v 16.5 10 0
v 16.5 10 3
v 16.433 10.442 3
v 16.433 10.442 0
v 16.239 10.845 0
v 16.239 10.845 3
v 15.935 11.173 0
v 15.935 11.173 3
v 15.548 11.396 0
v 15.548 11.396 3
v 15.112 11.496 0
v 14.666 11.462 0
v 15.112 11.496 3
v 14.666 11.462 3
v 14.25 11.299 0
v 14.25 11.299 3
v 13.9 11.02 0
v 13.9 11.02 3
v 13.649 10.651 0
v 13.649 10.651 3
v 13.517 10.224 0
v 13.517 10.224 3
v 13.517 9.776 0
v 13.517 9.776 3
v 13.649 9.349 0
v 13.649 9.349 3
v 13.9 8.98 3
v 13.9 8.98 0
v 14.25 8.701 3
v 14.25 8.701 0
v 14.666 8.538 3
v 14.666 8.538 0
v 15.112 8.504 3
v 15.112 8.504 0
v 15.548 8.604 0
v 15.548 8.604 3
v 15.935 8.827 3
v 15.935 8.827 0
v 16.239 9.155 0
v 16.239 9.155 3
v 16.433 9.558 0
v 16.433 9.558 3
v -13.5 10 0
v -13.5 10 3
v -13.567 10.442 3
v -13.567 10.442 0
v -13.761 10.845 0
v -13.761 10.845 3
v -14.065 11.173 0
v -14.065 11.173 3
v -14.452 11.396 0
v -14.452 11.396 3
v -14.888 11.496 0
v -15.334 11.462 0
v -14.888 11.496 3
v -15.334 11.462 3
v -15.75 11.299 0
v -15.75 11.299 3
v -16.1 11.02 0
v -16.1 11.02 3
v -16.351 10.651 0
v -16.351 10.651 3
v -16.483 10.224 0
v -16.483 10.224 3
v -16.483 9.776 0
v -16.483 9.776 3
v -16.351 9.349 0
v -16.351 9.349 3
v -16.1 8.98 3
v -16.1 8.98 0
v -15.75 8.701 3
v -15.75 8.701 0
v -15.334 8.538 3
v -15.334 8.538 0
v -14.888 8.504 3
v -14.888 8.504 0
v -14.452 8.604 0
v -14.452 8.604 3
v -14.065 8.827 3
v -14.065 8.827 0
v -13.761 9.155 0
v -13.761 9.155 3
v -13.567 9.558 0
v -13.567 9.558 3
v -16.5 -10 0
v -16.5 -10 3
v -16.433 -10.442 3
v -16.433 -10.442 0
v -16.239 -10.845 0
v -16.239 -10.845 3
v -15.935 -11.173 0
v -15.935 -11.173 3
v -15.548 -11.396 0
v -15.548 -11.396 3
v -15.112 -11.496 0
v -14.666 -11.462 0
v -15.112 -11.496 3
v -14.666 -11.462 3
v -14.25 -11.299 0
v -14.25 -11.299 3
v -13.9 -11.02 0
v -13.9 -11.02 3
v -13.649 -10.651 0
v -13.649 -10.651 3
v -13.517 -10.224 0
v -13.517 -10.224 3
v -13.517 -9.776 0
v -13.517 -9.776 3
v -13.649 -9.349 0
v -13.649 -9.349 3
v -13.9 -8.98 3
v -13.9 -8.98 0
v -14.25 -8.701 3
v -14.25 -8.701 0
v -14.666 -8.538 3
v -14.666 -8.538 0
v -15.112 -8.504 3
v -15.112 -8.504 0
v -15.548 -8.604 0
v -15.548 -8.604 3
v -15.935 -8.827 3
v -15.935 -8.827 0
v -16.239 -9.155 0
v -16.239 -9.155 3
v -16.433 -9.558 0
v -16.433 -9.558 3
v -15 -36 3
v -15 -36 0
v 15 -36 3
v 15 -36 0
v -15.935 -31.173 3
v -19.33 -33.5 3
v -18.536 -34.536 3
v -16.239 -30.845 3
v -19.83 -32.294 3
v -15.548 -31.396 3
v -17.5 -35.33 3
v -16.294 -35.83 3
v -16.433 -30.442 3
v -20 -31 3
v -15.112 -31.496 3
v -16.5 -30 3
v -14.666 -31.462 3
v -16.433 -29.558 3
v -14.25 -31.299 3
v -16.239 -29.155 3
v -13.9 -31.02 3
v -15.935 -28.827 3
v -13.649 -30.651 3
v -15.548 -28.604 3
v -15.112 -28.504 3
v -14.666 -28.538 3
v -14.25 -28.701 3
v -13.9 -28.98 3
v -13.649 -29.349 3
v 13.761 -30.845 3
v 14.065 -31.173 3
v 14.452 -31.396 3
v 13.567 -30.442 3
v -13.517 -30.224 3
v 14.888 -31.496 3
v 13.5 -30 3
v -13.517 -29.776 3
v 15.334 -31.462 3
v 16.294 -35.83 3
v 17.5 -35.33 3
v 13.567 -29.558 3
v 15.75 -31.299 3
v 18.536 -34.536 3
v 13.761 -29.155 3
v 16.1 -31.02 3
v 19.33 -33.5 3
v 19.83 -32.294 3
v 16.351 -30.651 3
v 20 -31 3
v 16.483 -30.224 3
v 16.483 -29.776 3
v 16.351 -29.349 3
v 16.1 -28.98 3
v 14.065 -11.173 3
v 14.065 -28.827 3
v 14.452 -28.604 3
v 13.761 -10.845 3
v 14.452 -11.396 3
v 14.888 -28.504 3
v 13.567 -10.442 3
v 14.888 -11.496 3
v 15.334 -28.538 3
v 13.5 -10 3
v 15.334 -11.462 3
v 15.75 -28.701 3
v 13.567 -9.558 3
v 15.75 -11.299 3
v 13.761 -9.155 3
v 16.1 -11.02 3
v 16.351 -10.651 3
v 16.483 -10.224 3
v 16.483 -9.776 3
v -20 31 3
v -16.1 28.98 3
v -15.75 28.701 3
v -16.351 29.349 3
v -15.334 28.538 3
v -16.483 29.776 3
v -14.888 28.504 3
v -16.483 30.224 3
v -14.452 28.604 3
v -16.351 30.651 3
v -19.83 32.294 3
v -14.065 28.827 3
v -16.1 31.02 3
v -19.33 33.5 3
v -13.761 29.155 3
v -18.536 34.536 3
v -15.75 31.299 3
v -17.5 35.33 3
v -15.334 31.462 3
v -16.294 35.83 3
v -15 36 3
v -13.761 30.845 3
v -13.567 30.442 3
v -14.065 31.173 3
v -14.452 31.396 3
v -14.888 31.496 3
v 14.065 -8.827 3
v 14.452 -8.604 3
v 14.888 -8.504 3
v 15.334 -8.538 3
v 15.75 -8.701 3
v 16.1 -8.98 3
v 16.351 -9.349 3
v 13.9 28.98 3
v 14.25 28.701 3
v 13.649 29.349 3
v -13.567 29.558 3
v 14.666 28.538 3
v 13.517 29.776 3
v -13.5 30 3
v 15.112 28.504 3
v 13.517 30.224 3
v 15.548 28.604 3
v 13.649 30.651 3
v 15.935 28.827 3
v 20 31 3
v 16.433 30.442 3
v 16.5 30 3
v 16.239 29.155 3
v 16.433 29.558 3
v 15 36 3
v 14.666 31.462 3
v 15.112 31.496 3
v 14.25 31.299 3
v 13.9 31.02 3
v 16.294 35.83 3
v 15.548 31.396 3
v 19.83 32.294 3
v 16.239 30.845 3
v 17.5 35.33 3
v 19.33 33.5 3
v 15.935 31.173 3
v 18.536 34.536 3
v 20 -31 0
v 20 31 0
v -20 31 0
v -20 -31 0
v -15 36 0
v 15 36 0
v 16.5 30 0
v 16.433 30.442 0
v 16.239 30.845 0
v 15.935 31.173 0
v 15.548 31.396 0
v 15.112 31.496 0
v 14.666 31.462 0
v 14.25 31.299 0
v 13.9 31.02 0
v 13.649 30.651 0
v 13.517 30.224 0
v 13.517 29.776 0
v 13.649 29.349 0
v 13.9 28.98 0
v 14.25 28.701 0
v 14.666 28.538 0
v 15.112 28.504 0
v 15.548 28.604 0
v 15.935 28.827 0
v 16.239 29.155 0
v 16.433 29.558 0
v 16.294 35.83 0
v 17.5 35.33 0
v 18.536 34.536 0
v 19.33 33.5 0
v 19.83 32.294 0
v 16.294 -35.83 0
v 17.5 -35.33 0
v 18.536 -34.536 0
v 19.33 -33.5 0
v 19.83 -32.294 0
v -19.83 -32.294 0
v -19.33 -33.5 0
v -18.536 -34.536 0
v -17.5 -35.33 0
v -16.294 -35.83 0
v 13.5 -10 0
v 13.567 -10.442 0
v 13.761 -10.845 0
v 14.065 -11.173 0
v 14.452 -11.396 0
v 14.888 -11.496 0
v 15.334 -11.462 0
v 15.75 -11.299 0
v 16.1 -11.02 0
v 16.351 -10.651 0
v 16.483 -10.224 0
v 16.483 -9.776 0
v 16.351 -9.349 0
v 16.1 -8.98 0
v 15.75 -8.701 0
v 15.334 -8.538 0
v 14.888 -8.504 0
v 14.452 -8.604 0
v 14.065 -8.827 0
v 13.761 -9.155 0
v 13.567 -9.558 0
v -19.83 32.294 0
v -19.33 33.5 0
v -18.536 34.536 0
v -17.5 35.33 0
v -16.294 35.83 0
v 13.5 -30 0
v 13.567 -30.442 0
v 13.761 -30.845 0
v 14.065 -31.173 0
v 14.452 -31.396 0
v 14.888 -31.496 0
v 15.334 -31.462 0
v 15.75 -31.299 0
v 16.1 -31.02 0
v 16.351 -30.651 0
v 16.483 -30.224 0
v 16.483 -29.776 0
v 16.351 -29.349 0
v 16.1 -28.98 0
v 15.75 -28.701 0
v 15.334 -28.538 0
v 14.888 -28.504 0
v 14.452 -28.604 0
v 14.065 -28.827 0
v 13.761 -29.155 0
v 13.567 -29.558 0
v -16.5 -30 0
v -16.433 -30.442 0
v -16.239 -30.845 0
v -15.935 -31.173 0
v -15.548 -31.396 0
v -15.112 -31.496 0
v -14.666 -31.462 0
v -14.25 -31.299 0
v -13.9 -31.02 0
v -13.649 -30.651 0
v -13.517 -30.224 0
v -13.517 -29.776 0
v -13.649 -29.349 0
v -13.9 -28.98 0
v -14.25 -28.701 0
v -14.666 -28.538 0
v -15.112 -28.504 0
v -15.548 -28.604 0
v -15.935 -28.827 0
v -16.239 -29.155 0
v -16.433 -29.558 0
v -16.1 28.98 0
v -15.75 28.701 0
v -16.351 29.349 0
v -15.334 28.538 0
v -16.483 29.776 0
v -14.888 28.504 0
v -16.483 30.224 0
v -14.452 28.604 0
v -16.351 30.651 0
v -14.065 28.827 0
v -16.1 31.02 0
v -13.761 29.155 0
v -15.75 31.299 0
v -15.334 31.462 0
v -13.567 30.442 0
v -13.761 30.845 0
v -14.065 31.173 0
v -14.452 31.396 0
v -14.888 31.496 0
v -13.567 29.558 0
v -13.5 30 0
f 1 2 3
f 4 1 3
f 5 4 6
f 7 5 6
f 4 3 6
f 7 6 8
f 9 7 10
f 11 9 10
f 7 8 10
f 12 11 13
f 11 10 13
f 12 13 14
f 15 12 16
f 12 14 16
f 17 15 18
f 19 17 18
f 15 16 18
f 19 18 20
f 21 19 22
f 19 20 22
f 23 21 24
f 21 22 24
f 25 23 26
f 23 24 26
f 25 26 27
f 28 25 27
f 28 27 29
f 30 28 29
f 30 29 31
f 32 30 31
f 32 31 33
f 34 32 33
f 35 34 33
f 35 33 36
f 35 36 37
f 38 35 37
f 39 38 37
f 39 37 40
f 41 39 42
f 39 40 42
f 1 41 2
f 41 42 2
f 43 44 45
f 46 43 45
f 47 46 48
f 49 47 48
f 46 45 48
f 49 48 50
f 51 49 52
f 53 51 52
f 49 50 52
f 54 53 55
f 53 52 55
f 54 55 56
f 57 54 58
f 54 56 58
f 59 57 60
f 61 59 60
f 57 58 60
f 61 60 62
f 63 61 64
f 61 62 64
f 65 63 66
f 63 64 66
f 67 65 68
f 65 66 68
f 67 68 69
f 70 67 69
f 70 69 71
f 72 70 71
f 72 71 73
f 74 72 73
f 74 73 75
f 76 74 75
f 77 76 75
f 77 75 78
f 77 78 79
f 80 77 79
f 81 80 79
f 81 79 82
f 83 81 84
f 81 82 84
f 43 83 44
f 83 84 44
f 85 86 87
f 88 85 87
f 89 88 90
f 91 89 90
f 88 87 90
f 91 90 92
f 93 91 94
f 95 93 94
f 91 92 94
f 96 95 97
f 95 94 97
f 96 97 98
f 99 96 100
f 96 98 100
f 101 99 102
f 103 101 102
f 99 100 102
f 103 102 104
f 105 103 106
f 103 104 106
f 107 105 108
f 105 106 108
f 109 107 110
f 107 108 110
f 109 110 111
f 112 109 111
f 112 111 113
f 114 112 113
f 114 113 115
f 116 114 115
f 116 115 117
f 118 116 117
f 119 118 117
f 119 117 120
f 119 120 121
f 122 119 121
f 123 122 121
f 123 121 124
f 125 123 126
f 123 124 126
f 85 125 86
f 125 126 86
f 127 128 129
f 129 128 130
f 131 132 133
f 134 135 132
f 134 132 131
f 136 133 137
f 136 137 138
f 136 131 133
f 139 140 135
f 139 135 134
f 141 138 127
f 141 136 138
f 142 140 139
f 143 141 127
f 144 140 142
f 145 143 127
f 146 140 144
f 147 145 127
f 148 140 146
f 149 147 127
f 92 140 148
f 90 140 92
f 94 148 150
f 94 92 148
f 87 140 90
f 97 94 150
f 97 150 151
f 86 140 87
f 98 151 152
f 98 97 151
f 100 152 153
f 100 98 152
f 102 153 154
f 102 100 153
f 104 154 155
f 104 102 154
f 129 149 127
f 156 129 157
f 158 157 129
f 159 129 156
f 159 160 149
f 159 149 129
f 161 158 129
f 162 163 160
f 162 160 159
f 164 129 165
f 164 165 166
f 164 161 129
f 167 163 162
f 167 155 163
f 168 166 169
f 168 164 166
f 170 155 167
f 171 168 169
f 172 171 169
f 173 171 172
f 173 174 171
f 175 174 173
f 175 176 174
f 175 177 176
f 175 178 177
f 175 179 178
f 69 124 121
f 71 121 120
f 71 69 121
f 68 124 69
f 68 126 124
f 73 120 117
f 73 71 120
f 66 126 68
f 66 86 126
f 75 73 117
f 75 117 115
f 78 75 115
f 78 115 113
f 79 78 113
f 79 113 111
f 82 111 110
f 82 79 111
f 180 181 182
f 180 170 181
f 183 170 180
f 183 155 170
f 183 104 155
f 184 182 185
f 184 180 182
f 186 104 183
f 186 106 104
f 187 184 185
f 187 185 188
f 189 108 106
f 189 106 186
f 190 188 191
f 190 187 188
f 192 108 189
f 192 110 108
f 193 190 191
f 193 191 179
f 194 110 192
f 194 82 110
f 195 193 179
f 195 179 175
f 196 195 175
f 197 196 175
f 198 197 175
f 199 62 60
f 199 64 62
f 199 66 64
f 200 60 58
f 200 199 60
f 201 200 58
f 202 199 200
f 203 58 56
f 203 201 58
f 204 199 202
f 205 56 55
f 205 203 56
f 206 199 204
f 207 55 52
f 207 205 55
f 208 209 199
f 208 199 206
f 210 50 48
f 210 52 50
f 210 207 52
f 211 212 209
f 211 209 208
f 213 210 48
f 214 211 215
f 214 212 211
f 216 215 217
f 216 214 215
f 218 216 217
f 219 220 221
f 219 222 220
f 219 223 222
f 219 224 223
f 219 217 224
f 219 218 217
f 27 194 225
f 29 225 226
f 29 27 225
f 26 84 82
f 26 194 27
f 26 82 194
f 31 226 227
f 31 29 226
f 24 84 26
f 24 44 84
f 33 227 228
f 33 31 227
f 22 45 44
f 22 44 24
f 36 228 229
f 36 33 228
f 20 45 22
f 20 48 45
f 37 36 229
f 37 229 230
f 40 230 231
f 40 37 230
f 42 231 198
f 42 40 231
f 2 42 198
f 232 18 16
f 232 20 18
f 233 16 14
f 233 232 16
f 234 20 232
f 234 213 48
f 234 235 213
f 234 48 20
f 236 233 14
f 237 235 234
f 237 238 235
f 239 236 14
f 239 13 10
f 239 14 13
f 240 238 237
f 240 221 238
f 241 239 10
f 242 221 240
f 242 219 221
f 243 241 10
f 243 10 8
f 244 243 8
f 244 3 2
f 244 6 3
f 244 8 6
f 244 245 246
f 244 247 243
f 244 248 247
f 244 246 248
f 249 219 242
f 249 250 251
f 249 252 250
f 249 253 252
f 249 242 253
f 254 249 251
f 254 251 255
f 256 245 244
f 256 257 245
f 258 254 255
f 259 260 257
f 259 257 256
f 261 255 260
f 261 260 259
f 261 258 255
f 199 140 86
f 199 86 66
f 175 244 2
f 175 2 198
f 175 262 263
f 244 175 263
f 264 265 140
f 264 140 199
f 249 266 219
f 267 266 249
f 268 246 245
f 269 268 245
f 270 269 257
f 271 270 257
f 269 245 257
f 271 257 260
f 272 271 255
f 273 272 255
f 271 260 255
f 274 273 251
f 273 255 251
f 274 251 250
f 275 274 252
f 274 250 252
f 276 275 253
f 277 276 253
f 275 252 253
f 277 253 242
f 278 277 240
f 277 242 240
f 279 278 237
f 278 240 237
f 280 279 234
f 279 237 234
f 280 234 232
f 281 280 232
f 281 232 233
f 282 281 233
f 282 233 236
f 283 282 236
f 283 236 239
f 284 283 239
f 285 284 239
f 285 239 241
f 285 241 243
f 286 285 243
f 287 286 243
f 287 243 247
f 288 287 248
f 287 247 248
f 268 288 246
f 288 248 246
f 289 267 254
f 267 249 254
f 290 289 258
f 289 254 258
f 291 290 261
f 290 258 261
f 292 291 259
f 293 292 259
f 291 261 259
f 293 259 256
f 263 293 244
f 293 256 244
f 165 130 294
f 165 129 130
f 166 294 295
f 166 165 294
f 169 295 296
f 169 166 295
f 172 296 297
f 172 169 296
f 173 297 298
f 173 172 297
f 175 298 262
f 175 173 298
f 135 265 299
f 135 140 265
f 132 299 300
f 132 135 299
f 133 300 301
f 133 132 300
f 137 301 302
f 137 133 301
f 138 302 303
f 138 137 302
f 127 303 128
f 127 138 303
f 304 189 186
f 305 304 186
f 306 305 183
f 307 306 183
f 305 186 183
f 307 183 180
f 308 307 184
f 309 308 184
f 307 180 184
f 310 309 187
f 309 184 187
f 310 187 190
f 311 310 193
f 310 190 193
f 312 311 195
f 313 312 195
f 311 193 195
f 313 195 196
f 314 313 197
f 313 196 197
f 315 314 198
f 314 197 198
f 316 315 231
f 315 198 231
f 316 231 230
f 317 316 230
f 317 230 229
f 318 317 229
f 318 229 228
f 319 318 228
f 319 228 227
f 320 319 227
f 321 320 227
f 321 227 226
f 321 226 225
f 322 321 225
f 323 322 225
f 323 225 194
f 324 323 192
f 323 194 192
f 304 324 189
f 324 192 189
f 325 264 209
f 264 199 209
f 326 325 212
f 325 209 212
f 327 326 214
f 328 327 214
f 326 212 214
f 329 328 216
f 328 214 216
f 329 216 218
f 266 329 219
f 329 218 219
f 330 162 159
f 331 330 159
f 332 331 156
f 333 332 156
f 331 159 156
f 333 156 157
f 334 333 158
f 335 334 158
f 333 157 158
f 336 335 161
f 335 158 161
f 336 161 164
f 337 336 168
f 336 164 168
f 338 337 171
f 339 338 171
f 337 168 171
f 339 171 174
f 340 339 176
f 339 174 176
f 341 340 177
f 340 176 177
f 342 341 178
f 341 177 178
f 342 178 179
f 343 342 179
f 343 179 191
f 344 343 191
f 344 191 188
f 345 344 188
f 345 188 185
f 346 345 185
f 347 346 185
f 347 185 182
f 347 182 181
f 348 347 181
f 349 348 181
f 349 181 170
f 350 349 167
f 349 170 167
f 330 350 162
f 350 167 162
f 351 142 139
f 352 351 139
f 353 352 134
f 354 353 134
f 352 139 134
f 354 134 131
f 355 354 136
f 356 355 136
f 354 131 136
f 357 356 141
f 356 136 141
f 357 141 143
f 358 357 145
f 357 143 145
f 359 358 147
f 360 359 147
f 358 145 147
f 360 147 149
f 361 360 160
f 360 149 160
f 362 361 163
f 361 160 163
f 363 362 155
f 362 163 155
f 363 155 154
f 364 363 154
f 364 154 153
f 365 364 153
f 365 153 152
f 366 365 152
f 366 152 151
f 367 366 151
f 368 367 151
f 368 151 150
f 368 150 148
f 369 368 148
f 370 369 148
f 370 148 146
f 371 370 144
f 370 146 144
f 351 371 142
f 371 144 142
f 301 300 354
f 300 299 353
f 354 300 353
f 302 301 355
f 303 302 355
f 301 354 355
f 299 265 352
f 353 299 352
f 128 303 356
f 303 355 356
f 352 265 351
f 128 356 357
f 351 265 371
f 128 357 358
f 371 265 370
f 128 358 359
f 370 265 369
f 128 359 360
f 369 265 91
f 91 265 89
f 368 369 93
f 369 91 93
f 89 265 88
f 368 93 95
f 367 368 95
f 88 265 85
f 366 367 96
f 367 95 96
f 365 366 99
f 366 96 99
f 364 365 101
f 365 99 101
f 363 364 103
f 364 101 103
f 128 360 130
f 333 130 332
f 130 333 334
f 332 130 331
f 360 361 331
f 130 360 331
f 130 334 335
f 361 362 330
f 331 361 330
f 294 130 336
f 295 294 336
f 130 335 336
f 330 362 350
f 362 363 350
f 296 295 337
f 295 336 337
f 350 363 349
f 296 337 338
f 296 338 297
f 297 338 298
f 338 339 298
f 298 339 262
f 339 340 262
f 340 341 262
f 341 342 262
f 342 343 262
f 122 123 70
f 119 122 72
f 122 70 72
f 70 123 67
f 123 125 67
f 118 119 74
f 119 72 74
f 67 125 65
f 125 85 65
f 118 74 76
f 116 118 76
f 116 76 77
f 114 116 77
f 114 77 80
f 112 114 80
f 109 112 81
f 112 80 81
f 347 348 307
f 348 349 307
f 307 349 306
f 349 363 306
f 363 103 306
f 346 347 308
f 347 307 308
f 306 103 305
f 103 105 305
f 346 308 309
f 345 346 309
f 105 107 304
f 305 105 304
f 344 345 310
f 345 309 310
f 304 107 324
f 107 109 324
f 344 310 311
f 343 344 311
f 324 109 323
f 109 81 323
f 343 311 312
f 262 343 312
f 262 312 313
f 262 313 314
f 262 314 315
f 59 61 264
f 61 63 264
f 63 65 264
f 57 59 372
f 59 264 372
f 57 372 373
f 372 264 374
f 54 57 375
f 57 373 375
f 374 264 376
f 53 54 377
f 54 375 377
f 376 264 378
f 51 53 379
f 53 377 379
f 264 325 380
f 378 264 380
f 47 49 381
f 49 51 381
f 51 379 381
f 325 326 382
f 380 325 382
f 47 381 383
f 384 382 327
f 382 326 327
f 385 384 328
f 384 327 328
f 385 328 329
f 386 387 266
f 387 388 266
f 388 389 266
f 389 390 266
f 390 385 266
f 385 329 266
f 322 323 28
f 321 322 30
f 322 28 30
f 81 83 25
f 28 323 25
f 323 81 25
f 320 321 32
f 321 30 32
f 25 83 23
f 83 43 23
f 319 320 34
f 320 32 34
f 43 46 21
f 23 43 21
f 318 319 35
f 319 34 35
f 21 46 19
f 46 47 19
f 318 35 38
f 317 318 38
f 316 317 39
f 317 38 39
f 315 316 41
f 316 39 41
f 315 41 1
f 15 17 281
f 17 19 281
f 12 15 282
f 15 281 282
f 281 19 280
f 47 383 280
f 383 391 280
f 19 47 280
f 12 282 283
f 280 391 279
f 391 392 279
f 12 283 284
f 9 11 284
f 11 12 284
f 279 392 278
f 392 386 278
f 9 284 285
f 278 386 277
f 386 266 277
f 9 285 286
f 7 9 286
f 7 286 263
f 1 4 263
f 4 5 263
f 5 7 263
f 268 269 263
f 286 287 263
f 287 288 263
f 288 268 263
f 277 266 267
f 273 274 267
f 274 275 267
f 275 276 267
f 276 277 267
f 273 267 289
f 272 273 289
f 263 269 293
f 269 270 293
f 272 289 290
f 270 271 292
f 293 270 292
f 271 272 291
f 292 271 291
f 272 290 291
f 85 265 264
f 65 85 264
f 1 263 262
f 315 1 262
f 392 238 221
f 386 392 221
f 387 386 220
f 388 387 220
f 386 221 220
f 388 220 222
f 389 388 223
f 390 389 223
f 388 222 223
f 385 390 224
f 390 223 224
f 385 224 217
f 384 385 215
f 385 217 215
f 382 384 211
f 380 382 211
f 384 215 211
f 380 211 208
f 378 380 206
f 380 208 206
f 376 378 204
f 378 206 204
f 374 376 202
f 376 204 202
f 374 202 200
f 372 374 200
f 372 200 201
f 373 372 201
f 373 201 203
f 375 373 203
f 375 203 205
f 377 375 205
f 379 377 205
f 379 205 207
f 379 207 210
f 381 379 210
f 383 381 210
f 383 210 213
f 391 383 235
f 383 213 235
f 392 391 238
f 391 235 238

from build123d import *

# Parameters (mm, degrees)
SKETCH_1_W          = 40
SKETCH_1_H          = 72
EXTRUDE_1_DEPTH     = 3
SKETCH_2_R          = 1.5
CUT_EXTRUDE_1_DEPTH = 3
FILLET_1_R          = 5


with BuildPart() as part:
    # 草图1 → 凸台-拉伸1 (new body)
    with BuildSketch(Plane.XY):
        Rectangle(SKETCH_1_W, SKETCH_1_H)
    extrude(amount=EXTRUDE_1_DEPTH)

    # 草图2 → 切除-拉伸1 (cut)
    with BuildSketch(Plane.XY.offset(3)):
        with Locations((-15, 30)):
            Circle(SKETCH_2_R)
        with Locations((-15, 10)):
            Circle(SKETCH_2_R)
        with Locations((15, 30)):
            Circle(SKETCH_2_R)
        with Locations((15, 10)):
            Circle(SKETCH_2_R)
        with Locations(Location((-15, -10, 0), (0, 0, 180))):
            Circle(SKETCH_2_R)
        with Locations(Location((15, -10, 0), (0, 0, 180))):
            Circle(SKETCH_2_R)
        with Locations(Location((15, -30, 0), (0, 0, 180))):
            Circle(SKETCH_2_R)
        with Locations(Location((-15, -30, 0), (0, 0, 180))):
            Circle(SKETCH_2_R)
    extrude(amount=-CUT_EXTRUDE_1_DEPTH, mode=Mode.SUBTRACT)

    # 圆角1
    fillet_1_edges = [part.edges().sort_by_distance(p)[0] for p in [
        (20, -36, 1.5),
        (-20, -36, 1.5),
        (-20, 36, 1.5),
        (20, 36, 1.5),
    ]]
    fillet(fillet_1_edges, radius=FILLET_1_R)


solid = part.part
